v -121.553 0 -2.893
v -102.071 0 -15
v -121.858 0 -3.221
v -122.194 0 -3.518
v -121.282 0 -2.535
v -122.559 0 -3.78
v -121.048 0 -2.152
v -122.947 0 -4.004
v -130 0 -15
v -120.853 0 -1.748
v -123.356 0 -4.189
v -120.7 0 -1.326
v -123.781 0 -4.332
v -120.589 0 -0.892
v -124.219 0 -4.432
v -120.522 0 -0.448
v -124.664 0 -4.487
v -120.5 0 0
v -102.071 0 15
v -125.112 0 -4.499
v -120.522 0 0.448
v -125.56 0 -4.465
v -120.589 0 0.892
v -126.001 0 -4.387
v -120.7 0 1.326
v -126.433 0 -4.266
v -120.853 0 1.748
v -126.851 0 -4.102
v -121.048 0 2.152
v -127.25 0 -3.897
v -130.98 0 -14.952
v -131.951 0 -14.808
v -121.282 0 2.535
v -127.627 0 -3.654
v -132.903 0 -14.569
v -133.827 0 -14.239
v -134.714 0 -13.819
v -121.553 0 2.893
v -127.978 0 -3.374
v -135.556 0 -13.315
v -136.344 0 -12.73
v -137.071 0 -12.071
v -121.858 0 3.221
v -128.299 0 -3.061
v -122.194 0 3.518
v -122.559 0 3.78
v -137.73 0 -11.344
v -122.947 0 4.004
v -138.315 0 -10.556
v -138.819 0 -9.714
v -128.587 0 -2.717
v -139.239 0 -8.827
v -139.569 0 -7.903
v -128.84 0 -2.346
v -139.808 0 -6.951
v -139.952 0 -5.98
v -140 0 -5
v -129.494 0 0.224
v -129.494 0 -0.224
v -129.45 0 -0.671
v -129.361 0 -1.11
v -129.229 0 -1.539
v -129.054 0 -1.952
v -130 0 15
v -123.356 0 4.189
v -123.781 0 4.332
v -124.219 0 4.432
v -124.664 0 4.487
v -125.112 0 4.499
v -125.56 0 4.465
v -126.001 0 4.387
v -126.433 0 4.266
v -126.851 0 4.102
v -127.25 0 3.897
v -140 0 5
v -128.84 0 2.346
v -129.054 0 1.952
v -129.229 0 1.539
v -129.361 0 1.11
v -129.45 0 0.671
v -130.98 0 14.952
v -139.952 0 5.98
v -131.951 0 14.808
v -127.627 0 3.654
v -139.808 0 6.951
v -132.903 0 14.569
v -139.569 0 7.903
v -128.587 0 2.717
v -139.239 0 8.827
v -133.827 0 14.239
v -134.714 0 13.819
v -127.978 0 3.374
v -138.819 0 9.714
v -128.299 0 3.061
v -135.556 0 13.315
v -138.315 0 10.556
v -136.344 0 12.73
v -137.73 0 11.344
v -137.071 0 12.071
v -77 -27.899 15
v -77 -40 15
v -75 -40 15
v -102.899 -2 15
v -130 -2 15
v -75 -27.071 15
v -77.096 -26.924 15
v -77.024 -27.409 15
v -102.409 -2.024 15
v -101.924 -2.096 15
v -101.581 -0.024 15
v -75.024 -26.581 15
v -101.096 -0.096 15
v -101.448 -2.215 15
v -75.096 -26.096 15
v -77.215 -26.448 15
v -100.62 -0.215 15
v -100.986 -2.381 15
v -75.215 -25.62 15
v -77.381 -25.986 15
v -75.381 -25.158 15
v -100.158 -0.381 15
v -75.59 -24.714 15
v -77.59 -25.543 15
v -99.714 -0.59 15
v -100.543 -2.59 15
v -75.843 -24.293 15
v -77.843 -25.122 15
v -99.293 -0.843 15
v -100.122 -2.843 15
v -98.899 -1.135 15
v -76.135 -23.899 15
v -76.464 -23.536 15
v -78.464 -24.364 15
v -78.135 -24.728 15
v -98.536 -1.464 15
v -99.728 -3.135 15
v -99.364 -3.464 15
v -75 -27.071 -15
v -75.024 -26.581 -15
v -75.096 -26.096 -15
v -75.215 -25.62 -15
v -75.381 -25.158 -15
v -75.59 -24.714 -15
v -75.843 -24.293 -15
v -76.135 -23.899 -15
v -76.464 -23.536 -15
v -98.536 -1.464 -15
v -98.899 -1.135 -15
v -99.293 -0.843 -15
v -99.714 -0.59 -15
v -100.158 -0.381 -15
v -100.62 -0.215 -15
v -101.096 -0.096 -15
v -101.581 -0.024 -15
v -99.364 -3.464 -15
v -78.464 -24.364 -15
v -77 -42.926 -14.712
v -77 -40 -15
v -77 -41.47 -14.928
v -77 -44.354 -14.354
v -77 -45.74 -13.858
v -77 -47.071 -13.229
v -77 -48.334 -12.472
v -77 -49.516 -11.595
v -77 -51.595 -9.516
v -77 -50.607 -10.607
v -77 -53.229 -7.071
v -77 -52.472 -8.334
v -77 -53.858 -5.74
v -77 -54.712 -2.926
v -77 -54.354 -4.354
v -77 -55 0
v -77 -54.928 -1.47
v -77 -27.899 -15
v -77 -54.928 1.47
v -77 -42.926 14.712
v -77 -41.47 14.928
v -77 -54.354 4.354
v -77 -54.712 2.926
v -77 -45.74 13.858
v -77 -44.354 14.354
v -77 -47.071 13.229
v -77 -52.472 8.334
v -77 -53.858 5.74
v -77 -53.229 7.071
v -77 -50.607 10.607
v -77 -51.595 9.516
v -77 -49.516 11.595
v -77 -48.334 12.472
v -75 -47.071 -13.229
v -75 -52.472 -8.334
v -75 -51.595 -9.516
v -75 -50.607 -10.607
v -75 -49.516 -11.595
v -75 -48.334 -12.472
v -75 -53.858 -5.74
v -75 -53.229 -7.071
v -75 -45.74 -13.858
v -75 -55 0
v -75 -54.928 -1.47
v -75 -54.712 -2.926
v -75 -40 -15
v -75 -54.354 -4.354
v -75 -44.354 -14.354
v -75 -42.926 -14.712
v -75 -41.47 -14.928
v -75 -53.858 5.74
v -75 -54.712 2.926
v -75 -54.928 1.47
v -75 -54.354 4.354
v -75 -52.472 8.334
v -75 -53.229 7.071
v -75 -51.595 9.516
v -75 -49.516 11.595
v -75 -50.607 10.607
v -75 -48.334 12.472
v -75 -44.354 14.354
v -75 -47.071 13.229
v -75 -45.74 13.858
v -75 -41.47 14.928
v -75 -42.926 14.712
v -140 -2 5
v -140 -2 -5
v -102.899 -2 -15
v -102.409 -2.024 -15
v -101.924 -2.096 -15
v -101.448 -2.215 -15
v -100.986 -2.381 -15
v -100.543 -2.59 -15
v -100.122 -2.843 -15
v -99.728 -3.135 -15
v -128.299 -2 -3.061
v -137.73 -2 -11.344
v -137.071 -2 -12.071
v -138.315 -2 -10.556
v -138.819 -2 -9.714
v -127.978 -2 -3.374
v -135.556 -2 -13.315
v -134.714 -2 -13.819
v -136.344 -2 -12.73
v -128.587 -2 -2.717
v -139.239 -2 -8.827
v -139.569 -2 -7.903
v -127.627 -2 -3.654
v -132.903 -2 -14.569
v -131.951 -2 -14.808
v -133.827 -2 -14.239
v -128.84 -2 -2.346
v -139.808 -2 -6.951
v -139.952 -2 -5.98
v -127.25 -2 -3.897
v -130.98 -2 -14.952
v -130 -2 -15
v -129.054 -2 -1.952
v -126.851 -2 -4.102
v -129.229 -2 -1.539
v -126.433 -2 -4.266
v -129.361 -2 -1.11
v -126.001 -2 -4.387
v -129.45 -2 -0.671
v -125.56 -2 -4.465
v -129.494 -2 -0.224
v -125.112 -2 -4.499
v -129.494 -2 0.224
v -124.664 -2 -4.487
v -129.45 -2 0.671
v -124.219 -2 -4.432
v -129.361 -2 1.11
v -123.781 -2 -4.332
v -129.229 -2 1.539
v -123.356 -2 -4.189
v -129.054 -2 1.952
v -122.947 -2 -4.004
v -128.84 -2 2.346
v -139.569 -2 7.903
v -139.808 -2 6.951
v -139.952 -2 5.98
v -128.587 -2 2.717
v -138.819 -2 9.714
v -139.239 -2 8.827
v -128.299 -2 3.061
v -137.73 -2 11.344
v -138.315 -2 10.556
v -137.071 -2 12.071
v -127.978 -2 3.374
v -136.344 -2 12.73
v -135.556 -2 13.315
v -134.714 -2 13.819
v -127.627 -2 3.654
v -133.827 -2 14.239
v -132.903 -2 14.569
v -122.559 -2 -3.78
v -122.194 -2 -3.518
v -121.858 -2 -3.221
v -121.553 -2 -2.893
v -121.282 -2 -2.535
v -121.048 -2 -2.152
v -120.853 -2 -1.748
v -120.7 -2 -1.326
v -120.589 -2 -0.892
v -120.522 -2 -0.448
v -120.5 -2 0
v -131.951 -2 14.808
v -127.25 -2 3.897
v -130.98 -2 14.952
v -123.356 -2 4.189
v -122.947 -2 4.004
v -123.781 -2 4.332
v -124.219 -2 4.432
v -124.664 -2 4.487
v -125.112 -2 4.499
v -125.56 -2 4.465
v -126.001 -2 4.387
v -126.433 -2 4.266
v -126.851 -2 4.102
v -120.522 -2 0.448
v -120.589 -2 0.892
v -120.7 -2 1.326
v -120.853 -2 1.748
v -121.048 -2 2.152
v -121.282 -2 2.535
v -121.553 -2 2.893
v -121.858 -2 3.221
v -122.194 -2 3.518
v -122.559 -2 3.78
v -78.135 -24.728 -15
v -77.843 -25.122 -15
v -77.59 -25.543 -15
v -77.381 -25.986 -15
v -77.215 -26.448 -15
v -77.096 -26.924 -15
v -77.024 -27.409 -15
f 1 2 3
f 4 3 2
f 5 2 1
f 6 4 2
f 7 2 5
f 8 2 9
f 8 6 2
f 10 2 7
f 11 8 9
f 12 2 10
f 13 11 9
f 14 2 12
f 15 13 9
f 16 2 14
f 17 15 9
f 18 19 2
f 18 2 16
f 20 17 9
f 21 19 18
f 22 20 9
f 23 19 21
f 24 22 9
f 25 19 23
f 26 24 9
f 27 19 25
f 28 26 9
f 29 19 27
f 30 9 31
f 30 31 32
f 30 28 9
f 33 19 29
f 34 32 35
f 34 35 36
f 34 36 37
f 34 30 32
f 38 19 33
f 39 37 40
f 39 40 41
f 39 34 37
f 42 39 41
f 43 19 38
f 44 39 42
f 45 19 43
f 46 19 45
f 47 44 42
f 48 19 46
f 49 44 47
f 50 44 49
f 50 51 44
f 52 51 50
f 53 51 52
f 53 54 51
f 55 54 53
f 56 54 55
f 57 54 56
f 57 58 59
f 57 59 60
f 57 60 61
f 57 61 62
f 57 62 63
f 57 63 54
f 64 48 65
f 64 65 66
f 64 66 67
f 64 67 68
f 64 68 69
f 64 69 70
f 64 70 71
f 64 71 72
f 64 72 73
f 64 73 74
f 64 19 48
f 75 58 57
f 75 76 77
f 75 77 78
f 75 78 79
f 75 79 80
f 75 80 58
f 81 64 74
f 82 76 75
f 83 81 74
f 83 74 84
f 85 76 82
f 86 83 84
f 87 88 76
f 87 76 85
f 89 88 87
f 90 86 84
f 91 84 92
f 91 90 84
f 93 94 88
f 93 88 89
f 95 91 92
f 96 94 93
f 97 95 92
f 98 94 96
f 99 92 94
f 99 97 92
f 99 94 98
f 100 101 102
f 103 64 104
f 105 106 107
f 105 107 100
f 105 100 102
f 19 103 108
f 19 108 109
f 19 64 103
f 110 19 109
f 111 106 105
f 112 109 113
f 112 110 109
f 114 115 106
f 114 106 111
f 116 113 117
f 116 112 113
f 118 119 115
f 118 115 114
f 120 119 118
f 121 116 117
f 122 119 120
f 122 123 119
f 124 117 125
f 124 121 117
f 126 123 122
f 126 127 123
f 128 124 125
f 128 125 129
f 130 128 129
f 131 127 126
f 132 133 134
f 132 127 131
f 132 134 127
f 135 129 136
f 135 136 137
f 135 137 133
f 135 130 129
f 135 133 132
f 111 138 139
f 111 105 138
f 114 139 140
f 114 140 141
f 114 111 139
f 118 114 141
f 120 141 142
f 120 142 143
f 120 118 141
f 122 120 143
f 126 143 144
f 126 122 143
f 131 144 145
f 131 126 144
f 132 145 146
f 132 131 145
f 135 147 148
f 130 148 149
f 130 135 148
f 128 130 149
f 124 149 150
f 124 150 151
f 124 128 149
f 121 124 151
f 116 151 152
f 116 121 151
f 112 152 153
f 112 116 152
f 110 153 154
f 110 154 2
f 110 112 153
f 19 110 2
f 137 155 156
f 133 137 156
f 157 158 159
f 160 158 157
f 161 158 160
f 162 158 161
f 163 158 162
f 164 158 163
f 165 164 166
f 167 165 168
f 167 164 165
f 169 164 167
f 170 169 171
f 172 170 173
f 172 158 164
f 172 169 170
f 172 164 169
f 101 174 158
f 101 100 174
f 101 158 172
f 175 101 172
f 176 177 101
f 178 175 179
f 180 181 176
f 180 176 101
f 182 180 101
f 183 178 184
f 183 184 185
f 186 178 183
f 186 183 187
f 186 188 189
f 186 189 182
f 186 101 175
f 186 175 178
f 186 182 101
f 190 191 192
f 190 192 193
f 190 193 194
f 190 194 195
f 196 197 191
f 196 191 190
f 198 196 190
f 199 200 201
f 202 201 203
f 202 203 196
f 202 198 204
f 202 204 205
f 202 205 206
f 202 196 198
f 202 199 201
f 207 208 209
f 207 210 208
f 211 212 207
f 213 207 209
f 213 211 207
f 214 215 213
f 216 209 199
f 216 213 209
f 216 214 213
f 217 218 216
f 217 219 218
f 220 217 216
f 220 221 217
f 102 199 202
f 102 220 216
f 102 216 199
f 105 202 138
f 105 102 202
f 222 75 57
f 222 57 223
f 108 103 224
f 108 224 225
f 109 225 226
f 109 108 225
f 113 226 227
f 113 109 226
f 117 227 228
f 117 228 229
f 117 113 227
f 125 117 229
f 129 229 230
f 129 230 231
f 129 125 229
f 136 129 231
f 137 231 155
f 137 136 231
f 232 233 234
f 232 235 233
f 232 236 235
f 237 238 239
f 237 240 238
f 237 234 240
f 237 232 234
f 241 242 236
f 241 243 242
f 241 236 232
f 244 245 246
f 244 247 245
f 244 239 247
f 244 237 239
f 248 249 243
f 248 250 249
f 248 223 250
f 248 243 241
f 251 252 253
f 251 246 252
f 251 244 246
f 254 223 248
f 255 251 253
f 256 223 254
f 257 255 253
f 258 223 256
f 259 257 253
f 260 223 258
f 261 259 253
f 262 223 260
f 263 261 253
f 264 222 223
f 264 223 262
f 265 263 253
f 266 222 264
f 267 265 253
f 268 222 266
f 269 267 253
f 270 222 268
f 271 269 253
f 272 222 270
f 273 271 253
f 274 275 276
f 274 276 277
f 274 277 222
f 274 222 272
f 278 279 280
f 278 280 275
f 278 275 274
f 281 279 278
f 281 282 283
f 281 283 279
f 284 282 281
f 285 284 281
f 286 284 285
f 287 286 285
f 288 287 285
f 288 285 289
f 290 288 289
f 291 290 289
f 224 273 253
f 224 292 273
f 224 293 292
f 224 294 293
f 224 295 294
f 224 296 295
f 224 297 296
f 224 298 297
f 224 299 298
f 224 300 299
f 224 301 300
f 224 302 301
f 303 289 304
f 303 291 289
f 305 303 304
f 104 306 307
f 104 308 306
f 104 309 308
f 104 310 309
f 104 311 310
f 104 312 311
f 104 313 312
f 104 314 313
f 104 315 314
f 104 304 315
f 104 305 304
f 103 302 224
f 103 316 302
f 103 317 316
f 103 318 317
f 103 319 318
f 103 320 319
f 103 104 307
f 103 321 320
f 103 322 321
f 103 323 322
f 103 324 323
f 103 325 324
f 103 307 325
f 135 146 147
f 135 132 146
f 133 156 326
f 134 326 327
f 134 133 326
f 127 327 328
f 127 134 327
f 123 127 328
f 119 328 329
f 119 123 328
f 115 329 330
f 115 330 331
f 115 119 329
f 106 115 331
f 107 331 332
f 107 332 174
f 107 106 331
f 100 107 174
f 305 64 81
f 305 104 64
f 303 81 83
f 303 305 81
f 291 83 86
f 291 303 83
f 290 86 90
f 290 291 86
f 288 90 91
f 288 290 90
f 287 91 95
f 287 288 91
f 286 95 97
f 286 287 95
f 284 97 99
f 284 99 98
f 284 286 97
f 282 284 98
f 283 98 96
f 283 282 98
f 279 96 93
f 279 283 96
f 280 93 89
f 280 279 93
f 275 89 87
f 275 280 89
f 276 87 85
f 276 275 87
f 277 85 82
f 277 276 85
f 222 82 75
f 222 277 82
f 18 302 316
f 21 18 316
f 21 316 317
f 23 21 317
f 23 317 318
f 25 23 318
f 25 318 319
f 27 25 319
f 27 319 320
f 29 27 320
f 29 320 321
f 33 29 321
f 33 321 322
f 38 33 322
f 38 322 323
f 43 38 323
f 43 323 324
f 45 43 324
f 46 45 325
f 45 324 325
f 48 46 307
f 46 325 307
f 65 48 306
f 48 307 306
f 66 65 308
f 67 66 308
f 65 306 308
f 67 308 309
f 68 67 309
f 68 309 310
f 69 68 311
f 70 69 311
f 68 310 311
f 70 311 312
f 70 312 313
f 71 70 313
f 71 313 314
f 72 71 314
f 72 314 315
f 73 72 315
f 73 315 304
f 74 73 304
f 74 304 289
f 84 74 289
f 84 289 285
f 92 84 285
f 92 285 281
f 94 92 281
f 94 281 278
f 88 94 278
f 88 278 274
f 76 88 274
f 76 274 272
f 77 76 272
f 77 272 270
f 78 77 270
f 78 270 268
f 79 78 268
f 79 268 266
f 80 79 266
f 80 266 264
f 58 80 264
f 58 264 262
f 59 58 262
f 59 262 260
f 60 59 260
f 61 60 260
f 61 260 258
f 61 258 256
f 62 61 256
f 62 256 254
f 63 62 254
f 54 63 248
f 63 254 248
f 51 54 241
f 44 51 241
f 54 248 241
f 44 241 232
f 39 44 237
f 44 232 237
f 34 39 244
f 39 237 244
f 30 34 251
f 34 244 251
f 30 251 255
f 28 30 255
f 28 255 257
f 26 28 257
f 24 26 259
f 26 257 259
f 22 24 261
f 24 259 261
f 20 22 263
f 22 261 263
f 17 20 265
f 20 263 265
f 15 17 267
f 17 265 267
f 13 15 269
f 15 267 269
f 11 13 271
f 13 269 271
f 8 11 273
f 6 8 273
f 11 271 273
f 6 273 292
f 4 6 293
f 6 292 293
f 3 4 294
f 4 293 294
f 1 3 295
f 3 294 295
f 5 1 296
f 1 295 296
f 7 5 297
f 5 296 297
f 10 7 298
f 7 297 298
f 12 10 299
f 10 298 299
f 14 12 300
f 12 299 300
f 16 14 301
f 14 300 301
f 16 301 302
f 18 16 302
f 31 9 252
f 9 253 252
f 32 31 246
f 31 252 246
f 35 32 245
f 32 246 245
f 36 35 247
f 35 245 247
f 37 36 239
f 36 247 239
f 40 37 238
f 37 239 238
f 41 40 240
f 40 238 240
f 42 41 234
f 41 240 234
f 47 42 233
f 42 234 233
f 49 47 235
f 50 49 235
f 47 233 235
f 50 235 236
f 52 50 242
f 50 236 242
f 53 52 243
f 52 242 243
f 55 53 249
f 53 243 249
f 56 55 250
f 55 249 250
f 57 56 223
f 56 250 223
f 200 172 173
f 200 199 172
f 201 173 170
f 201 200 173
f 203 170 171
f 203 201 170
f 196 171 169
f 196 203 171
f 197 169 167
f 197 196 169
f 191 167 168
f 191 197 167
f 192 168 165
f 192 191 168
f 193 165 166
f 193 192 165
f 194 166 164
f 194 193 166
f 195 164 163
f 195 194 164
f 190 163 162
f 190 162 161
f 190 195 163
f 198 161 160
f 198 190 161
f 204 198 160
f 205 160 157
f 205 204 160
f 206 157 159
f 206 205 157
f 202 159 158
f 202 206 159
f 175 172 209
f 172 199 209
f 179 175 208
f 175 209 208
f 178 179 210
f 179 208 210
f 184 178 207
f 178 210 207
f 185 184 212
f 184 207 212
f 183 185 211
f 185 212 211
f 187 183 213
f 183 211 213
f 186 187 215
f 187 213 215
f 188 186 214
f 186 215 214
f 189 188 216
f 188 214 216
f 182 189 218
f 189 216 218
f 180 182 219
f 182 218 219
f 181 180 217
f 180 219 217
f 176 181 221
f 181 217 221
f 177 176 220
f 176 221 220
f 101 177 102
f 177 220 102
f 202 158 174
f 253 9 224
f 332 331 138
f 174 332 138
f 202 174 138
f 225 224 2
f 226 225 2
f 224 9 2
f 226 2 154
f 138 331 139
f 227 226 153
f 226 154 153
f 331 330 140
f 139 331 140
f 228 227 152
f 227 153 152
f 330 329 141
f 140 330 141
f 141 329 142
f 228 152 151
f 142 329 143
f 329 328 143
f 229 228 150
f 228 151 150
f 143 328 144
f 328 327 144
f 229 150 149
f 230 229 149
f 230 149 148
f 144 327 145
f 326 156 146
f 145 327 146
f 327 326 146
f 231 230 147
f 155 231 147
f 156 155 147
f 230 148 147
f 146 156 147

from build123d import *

# Parameters (mm, degrees)
F1_DEPTH = 15
F2_R     = 14.99999
F3_R     = 4.5
F4_DEPTH = 2.001
F5_R     = 10


# Not quite as in the source:
# - a fillet or chamfer is up to 0.001 mm smaller than in the source, because OpenCascade refuses the exact size


with BuildPart() as f1:
    # F0 (on Top) → F1 (new body, symmetric)
    with BuildSketch(Plane.XY):
        with BuildLine():
            ThreePointArc((-98.5355339059, -1.4644660941), (-100.15765065, -0.3806023374), (-102.0710678119, 0))
            Line((-102.0710678119, 0), (-140, 0))
            Line((-140, 0), (-140, -2))
            Line((-140, -2), (-102.8994949366, -2))
            ThreePointArc((-102.8994949366, -2), (-100.9860777748, -2.3806023374), (-99.3639610307, -3.4644660941))
            Line((-99.3639610307, -3.4644660941), (-78.4644660941, -24.3639610307))
            ThreePointArc((-78.4644660941, -24.3639610307), (-77.3806023374, -25.9860777748), (-77, -27.8994949366))
            Line((-77, -27.8994949366), (-77, -55))
            Line((-77, -55), (-75, -55))
            Line((-75, -55), (-75, -27.0710678119))
            ThreePointArc((-75, -27.0710678119), (-75.3806023374, -25.15765065), (-76.4644660941, -23.5355339059))
            Line((-76.4644660941, -23.5355339059), (-98.5355339059, -1.4644660941))
        make_face()
    extrude(amount=F1_DEPTH, both=True)

    # F2 (radius 15 in the source; OpenCascade refuses exactly that, so slightly less here)
    f2_edges = [f1.edges().sort_by_distance(p)[0] for p in [
        (-76, -55, 15),
        (-76, -55, -15),
    ]]
    fillet(f2_edges, radius=F2_R)

    # F3 (on face) → F4 (cut, through all)
    with BuildSketch(Plane.XZ.offset(2)):
        with Locations((-125, 0)):
            Circle(F3_R)
    extrude(amount=-F4_DEPTH, mode=Mode.SUBTRACT)

    # F5
    f5_edges = [f1.edges().sort_by_distance(p)[0] for p in [
        (-140, -1, 15),
        (-140, -1, -15),
    ]]
    fillet(f5_edges, radius=F5_R)


solid = f1.part
